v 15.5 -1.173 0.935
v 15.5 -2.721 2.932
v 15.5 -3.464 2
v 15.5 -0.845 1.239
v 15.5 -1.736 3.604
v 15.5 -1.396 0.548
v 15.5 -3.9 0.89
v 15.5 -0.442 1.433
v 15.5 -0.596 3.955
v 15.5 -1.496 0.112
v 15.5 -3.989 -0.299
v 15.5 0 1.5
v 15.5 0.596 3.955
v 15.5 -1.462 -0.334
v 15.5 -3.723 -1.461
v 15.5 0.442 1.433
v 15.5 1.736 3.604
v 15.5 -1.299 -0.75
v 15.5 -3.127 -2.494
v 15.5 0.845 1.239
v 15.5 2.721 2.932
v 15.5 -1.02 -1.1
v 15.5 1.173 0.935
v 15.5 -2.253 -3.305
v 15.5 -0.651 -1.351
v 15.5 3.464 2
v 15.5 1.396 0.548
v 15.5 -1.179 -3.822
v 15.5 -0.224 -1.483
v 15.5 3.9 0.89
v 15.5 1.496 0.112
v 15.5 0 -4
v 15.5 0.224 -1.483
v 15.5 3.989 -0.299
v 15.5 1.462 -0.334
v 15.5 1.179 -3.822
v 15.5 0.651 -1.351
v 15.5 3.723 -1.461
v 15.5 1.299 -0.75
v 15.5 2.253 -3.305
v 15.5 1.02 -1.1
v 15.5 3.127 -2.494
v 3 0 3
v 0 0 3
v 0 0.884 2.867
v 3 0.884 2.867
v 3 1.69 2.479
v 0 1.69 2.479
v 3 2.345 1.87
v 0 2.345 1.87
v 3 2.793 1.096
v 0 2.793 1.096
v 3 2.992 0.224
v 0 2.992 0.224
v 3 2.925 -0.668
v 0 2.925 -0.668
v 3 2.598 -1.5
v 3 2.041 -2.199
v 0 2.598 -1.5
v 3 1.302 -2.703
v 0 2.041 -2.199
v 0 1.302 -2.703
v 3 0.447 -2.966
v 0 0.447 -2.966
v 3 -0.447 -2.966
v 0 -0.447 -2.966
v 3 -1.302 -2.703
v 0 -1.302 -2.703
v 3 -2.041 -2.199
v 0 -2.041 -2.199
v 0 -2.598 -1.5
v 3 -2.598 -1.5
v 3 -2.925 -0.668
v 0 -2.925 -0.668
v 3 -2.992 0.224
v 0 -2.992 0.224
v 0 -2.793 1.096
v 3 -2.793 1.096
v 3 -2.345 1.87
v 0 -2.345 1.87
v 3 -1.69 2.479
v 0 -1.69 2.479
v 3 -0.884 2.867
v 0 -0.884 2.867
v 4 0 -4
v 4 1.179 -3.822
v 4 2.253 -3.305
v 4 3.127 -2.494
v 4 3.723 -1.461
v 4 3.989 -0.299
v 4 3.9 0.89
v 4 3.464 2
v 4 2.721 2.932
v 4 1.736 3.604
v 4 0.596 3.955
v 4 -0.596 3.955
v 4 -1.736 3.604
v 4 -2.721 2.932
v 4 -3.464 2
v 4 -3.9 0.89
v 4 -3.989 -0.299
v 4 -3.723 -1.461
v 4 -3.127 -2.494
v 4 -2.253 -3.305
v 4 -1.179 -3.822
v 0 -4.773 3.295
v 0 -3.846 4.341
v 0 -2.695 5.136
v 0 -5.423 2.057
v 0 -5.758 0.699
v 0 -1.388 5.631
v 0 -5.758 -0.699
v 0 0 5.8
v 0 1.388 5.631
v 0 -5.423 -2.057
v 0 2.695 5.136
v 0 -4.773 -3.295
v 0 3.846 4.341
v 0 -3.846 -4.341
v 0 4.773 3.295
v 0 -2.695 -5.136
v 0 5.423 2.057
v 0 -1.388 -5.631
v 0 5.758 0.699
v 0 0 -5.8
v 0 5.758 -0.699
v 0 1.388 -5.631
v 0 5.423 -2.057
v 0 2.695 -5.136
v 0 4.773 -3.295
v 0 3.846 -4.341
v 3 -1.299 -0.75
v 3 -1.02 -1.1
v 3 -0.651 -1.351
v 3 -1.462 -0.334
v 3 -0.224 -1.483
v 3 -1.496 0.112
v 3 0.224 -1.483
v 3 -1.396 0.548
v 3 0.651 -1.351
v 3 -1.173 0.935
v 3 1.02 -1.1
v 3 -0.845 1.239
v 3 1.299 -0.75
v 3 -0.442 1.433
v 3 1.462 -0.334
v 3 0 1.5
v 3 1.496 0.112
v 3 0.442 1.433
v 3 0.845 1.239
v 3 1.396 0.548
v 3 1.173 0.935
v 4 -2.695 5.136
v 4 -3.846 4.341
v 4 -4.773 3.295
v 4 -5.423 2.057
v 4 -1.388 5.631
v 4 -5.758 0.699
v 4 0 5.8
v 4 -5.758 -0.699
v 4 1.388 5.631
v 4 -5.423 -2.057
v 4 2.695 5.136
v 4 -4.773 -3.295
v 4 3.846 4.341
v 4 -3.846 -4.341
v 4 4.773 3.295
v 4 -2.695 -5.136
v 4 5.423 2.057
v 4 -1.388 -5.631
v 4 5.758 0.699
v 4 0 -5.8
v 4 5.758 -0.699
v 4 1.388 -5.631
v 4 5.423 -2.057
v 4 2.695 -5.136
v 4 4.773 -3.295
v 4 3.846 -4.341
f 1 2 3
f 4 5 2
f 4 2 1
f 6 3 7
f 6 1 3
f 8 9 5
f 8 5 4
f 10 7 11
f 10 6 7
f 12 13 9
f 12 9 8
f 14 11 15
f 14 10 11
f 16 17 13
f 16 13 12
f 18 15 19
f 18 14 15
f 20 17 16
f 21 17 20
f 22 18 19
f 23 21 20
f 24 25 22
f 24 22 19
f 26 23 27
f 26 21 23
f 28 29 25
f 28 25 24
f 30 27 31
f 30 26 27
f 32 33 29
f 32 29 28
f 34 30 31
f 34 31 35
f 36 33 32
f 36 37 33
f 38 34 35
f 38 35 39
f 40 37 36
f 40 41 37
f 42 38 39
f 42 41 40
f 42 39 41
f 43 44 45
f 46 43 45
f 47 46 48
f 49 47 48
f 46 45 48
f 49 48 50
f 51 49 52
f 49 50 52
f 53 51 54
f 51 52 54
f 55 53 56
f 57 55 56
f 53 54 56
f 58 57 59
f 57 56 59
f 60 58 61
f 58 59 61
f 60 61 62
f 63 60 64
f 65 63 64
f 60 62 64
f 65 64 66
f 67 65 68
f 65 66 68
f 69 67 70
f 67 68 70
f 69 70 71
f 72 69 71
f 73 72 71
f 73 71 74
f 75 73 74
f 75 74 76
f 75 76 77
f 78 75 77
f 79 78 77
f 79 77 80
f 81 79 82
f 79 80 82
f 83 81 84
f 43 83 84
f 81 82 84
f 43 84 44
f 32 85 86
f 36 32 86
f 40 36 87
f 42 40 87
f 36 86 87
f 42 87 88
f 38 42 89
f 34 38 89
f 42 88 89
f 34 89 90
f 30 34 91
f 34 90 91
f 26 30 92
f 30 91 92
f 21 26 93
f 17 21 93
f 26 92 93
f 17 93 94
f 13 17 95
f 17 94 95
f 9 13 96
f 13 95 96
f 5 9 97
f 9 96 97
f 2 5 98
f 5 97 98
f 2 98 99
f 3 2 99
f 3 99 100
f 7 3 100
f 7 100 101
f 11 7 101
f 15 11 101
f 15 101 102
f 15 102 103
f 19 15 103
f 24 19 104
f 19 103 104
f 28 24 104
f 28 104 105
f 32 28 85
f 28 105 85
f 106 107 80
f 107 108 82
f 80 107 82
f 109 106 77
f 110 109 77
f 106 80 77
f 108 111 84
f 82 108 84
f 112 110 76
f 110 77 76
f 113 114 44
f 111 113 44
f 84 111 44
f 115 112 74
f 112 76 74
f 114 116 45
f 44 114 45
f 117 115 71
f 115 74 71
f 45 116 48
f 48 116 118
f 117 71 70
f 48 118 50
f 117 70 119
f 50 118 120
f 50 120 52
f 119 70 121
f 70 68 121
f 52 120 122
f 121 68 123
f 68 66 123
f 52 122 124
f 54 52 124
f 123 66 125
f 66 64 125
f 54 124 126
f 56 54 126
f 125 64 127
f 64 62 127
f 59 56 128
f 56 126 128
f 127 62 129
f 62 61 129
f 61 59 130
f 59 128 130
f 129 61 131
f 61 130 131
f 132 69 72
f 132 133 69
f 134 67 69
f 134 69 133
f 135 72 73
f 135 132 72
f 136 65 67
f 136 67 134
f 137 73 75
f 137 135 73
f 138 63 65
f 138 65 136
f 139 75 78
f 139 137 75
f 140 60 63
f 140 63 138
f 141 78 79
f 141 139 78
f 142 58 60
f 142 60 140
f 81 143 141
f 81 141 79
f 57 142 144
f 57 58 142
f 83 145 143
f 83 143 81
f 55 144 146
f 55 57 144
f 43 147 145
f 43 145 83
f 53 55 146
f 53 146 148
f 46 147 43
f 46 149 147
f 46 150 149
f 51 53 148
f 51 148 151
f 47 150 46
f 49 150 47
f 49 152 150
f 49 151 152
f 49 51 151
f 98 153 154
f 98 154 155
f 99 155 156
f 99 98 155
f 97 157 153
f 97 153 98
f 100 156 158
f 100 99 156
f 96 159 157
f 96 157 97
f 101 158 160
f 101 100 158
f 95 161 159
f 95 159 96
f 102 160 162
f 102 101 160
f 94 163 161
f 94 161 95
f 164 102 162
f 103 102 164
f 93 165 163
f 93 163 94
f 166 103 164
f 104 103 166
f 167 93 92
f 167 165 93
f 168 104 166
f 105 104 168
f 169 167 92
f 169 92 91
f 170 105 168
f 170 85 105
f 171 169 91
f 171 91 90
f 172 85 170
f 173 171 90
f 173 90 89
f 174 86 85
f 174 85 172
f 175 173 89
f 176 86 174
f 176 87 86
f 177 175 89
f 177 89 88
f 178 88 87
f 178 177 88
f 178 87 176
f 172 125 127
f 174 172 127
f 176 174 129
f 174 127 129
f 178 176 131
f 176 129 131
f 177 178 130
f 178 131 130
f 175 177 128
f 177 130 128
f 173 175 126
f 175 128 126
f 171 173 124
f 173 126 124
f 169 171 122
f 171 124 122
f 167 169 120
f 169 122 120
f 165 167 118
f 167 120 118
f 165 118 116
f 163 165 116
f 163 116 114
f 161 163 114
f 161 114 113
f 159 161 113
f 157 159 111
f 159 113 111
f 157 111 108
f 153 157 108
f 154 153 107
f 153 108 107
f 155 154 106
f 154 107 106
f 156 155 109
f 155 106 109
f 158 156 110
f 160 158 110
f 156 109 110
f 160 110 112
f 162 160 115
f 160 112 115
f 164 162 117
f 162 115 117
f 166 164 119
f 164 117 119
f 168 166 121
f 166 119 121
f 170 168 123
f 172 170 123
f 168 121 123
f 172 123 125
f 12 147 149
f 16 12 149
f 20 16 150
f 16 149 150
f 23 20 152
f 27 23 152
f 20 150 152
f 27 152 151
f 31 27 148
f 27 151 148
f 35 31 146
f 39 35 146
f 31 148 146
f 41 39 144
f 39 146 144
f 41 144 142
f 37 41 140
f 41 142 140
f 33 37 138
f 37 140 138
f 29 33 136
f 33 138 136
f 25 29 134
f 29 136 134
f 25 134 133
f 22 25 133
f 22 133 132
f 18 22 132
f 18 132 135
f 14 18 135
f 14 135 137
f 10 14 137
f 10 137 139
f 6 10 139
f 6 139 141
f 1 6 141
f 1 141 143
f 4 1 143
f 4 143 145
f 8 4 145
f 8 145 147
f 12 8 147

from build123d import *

# Parameters (mm, degrees)
SKETCH1_R           = 5.8
BOSS_EXTRUDE1_DEPTH = 4
SKETCH2_R           = 4
BOSS_EXTRUDE2_DEPTH = 11.5
SKETCH3_R           = 1.5
CUT_EXTRUDE1_DEPTH  = 20
SKETCH4_R           = 3
CUT_EXTRUDE2_DEPTH  = 3


with BuildPart() as part:
    # Sketch1 → Boss-Extrude1 (new body)
    with BuildSketch(Plane(origin=(0, 0, 0), x_dir=(0, 0, -1), z_dir=(1, 0, 0))):
        Circle(SKETCH1_R)
    extrude(amount=BOSS_EXTRUDE1_DEPTH)

    # Sketch2 → Boss-Extrude2 (add)
    with BuildSketch(Plane(origin=(4, 0, 0), x_dir=(0, 0, -1), z_dir=(1, 0, 0))):
        Circle(SKETCH2_R)
    extrude(amount=BOSS_EXTRUDE2_DEPTH)

    # Sketch3 → Cut-Extrude1 (cut)
    with BuildSketch(Plane.ZY):
        Circle(SKETCH3_R)
    extrude(amount=-CUT_EXTRUDE1_DEPTH, mode=Mode.SUBTRACT)

    # Sketch4 → Cut-Extrude2 (cut)
    with BuildSketch(Plane.ZY):
        Circle(SKETCH4_R)
    extrude(amount=-CUT_EXTRUDE2_DEPTH, mode=Mode.SUBTRACT)


solid = part.part
